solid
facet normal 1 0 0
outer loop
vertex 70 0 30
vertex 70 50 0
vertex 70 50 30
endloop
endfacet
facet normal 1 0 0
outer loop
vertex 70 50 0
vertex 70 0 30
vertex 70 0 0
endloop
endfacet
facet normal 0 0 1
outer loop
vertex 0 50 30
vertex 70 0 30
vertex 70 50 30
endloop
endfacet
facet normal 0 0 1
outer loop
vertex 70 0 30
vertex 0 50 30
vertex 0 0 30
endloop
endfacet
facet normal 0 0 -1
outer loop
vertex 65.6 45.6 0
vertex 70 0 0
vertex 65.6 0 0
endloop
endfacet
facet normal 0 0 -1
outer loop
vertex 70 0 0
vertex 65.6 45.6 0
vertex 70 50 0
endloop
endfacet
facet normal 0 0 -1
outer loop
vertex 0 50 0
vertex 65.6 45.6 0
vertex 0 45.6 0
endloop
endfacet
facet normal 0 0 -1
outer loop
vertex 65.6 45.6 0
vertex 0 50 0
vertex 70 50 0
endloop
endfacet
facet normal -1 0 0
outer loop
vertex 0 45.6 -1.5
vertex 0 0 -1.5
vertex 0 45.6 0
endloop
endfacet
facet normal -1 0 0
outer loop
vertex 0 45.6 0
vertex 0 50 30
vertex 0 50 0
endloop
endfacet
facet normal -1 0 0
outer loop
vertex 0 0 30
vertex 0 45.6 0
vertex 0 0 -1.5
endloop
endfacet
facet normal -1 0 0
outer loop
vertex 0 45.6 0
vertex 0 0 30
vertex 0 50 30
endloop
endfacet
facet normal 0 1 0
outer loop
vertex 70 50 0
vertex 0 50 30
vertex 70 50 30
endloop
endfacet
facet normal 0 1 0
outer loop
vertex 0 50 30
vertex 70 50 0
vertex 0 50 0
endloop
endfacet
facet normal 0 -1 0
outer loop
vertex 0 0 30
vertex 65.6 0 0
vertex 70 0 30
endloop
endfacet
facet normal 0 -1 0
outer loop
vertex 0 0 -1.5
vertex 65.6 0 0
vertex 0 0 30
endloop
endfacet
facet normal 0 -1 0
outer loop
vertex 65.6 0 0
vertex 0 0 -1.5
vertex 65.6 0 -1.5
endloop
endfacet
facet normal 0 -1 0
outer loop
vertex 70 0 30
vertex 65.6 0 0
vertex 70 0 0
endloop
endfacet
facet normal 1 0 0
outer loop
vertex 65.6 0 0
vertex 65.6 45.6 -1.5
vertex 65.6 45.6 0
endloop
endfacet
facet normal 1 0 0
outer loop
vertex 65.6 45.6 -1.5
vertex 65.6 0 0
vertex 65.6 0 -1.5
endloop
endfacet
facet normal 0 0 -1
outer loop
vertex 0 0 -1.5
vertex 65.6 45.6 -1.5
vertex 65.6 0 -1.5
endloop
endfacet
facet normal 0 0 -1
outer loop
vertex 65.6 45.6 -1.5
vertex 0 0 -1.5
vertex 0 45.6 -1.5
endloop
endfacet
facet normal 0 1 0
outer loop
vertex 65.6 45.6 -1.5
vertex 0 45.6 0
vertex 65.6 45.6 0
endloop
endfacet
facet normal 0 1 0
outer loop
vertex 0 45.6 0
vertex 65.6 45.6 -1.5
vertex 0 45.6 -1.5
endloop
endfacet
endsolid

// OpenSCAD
// Dimensions in mm
box_width = 70;
box_height = 50;
box_depth = 30;
lid_wall_thickness = 1.5;
lip_outer_size_x = 65.6;
lip_outer_size_y = 45.6;
lip_clearance = 0.2;

// Box
difference() {
    cube([box_width, box_height, box_depth]);
    
    translate([-1, -1, box_height])
        cube([box_width + 2, box_height + 2, lid_wall_thickness]);
}

// Lid
translate([0, 0, -lid_wall_thickness])
    difference() {
        // Plate
        cube([lip_outer_size_x, lip_outer_size_y, box_depth]);
        
        // Lip
        translate([-lip_clearance/2, -lip_clearance/2, lid_wall_thickness])
            cube([lip_outer_size_x + lip_clearance*2, lip_outer_size_y + lip_clearance*2, lid_wall_thickness]);
    }
    
// Gap between parts
translate([box_width/2 - lid_wall_thickness/2, 0, box_depth])
    linear_extrude(box_depth)
        cube([10, box_height, box_depth], center=true);
